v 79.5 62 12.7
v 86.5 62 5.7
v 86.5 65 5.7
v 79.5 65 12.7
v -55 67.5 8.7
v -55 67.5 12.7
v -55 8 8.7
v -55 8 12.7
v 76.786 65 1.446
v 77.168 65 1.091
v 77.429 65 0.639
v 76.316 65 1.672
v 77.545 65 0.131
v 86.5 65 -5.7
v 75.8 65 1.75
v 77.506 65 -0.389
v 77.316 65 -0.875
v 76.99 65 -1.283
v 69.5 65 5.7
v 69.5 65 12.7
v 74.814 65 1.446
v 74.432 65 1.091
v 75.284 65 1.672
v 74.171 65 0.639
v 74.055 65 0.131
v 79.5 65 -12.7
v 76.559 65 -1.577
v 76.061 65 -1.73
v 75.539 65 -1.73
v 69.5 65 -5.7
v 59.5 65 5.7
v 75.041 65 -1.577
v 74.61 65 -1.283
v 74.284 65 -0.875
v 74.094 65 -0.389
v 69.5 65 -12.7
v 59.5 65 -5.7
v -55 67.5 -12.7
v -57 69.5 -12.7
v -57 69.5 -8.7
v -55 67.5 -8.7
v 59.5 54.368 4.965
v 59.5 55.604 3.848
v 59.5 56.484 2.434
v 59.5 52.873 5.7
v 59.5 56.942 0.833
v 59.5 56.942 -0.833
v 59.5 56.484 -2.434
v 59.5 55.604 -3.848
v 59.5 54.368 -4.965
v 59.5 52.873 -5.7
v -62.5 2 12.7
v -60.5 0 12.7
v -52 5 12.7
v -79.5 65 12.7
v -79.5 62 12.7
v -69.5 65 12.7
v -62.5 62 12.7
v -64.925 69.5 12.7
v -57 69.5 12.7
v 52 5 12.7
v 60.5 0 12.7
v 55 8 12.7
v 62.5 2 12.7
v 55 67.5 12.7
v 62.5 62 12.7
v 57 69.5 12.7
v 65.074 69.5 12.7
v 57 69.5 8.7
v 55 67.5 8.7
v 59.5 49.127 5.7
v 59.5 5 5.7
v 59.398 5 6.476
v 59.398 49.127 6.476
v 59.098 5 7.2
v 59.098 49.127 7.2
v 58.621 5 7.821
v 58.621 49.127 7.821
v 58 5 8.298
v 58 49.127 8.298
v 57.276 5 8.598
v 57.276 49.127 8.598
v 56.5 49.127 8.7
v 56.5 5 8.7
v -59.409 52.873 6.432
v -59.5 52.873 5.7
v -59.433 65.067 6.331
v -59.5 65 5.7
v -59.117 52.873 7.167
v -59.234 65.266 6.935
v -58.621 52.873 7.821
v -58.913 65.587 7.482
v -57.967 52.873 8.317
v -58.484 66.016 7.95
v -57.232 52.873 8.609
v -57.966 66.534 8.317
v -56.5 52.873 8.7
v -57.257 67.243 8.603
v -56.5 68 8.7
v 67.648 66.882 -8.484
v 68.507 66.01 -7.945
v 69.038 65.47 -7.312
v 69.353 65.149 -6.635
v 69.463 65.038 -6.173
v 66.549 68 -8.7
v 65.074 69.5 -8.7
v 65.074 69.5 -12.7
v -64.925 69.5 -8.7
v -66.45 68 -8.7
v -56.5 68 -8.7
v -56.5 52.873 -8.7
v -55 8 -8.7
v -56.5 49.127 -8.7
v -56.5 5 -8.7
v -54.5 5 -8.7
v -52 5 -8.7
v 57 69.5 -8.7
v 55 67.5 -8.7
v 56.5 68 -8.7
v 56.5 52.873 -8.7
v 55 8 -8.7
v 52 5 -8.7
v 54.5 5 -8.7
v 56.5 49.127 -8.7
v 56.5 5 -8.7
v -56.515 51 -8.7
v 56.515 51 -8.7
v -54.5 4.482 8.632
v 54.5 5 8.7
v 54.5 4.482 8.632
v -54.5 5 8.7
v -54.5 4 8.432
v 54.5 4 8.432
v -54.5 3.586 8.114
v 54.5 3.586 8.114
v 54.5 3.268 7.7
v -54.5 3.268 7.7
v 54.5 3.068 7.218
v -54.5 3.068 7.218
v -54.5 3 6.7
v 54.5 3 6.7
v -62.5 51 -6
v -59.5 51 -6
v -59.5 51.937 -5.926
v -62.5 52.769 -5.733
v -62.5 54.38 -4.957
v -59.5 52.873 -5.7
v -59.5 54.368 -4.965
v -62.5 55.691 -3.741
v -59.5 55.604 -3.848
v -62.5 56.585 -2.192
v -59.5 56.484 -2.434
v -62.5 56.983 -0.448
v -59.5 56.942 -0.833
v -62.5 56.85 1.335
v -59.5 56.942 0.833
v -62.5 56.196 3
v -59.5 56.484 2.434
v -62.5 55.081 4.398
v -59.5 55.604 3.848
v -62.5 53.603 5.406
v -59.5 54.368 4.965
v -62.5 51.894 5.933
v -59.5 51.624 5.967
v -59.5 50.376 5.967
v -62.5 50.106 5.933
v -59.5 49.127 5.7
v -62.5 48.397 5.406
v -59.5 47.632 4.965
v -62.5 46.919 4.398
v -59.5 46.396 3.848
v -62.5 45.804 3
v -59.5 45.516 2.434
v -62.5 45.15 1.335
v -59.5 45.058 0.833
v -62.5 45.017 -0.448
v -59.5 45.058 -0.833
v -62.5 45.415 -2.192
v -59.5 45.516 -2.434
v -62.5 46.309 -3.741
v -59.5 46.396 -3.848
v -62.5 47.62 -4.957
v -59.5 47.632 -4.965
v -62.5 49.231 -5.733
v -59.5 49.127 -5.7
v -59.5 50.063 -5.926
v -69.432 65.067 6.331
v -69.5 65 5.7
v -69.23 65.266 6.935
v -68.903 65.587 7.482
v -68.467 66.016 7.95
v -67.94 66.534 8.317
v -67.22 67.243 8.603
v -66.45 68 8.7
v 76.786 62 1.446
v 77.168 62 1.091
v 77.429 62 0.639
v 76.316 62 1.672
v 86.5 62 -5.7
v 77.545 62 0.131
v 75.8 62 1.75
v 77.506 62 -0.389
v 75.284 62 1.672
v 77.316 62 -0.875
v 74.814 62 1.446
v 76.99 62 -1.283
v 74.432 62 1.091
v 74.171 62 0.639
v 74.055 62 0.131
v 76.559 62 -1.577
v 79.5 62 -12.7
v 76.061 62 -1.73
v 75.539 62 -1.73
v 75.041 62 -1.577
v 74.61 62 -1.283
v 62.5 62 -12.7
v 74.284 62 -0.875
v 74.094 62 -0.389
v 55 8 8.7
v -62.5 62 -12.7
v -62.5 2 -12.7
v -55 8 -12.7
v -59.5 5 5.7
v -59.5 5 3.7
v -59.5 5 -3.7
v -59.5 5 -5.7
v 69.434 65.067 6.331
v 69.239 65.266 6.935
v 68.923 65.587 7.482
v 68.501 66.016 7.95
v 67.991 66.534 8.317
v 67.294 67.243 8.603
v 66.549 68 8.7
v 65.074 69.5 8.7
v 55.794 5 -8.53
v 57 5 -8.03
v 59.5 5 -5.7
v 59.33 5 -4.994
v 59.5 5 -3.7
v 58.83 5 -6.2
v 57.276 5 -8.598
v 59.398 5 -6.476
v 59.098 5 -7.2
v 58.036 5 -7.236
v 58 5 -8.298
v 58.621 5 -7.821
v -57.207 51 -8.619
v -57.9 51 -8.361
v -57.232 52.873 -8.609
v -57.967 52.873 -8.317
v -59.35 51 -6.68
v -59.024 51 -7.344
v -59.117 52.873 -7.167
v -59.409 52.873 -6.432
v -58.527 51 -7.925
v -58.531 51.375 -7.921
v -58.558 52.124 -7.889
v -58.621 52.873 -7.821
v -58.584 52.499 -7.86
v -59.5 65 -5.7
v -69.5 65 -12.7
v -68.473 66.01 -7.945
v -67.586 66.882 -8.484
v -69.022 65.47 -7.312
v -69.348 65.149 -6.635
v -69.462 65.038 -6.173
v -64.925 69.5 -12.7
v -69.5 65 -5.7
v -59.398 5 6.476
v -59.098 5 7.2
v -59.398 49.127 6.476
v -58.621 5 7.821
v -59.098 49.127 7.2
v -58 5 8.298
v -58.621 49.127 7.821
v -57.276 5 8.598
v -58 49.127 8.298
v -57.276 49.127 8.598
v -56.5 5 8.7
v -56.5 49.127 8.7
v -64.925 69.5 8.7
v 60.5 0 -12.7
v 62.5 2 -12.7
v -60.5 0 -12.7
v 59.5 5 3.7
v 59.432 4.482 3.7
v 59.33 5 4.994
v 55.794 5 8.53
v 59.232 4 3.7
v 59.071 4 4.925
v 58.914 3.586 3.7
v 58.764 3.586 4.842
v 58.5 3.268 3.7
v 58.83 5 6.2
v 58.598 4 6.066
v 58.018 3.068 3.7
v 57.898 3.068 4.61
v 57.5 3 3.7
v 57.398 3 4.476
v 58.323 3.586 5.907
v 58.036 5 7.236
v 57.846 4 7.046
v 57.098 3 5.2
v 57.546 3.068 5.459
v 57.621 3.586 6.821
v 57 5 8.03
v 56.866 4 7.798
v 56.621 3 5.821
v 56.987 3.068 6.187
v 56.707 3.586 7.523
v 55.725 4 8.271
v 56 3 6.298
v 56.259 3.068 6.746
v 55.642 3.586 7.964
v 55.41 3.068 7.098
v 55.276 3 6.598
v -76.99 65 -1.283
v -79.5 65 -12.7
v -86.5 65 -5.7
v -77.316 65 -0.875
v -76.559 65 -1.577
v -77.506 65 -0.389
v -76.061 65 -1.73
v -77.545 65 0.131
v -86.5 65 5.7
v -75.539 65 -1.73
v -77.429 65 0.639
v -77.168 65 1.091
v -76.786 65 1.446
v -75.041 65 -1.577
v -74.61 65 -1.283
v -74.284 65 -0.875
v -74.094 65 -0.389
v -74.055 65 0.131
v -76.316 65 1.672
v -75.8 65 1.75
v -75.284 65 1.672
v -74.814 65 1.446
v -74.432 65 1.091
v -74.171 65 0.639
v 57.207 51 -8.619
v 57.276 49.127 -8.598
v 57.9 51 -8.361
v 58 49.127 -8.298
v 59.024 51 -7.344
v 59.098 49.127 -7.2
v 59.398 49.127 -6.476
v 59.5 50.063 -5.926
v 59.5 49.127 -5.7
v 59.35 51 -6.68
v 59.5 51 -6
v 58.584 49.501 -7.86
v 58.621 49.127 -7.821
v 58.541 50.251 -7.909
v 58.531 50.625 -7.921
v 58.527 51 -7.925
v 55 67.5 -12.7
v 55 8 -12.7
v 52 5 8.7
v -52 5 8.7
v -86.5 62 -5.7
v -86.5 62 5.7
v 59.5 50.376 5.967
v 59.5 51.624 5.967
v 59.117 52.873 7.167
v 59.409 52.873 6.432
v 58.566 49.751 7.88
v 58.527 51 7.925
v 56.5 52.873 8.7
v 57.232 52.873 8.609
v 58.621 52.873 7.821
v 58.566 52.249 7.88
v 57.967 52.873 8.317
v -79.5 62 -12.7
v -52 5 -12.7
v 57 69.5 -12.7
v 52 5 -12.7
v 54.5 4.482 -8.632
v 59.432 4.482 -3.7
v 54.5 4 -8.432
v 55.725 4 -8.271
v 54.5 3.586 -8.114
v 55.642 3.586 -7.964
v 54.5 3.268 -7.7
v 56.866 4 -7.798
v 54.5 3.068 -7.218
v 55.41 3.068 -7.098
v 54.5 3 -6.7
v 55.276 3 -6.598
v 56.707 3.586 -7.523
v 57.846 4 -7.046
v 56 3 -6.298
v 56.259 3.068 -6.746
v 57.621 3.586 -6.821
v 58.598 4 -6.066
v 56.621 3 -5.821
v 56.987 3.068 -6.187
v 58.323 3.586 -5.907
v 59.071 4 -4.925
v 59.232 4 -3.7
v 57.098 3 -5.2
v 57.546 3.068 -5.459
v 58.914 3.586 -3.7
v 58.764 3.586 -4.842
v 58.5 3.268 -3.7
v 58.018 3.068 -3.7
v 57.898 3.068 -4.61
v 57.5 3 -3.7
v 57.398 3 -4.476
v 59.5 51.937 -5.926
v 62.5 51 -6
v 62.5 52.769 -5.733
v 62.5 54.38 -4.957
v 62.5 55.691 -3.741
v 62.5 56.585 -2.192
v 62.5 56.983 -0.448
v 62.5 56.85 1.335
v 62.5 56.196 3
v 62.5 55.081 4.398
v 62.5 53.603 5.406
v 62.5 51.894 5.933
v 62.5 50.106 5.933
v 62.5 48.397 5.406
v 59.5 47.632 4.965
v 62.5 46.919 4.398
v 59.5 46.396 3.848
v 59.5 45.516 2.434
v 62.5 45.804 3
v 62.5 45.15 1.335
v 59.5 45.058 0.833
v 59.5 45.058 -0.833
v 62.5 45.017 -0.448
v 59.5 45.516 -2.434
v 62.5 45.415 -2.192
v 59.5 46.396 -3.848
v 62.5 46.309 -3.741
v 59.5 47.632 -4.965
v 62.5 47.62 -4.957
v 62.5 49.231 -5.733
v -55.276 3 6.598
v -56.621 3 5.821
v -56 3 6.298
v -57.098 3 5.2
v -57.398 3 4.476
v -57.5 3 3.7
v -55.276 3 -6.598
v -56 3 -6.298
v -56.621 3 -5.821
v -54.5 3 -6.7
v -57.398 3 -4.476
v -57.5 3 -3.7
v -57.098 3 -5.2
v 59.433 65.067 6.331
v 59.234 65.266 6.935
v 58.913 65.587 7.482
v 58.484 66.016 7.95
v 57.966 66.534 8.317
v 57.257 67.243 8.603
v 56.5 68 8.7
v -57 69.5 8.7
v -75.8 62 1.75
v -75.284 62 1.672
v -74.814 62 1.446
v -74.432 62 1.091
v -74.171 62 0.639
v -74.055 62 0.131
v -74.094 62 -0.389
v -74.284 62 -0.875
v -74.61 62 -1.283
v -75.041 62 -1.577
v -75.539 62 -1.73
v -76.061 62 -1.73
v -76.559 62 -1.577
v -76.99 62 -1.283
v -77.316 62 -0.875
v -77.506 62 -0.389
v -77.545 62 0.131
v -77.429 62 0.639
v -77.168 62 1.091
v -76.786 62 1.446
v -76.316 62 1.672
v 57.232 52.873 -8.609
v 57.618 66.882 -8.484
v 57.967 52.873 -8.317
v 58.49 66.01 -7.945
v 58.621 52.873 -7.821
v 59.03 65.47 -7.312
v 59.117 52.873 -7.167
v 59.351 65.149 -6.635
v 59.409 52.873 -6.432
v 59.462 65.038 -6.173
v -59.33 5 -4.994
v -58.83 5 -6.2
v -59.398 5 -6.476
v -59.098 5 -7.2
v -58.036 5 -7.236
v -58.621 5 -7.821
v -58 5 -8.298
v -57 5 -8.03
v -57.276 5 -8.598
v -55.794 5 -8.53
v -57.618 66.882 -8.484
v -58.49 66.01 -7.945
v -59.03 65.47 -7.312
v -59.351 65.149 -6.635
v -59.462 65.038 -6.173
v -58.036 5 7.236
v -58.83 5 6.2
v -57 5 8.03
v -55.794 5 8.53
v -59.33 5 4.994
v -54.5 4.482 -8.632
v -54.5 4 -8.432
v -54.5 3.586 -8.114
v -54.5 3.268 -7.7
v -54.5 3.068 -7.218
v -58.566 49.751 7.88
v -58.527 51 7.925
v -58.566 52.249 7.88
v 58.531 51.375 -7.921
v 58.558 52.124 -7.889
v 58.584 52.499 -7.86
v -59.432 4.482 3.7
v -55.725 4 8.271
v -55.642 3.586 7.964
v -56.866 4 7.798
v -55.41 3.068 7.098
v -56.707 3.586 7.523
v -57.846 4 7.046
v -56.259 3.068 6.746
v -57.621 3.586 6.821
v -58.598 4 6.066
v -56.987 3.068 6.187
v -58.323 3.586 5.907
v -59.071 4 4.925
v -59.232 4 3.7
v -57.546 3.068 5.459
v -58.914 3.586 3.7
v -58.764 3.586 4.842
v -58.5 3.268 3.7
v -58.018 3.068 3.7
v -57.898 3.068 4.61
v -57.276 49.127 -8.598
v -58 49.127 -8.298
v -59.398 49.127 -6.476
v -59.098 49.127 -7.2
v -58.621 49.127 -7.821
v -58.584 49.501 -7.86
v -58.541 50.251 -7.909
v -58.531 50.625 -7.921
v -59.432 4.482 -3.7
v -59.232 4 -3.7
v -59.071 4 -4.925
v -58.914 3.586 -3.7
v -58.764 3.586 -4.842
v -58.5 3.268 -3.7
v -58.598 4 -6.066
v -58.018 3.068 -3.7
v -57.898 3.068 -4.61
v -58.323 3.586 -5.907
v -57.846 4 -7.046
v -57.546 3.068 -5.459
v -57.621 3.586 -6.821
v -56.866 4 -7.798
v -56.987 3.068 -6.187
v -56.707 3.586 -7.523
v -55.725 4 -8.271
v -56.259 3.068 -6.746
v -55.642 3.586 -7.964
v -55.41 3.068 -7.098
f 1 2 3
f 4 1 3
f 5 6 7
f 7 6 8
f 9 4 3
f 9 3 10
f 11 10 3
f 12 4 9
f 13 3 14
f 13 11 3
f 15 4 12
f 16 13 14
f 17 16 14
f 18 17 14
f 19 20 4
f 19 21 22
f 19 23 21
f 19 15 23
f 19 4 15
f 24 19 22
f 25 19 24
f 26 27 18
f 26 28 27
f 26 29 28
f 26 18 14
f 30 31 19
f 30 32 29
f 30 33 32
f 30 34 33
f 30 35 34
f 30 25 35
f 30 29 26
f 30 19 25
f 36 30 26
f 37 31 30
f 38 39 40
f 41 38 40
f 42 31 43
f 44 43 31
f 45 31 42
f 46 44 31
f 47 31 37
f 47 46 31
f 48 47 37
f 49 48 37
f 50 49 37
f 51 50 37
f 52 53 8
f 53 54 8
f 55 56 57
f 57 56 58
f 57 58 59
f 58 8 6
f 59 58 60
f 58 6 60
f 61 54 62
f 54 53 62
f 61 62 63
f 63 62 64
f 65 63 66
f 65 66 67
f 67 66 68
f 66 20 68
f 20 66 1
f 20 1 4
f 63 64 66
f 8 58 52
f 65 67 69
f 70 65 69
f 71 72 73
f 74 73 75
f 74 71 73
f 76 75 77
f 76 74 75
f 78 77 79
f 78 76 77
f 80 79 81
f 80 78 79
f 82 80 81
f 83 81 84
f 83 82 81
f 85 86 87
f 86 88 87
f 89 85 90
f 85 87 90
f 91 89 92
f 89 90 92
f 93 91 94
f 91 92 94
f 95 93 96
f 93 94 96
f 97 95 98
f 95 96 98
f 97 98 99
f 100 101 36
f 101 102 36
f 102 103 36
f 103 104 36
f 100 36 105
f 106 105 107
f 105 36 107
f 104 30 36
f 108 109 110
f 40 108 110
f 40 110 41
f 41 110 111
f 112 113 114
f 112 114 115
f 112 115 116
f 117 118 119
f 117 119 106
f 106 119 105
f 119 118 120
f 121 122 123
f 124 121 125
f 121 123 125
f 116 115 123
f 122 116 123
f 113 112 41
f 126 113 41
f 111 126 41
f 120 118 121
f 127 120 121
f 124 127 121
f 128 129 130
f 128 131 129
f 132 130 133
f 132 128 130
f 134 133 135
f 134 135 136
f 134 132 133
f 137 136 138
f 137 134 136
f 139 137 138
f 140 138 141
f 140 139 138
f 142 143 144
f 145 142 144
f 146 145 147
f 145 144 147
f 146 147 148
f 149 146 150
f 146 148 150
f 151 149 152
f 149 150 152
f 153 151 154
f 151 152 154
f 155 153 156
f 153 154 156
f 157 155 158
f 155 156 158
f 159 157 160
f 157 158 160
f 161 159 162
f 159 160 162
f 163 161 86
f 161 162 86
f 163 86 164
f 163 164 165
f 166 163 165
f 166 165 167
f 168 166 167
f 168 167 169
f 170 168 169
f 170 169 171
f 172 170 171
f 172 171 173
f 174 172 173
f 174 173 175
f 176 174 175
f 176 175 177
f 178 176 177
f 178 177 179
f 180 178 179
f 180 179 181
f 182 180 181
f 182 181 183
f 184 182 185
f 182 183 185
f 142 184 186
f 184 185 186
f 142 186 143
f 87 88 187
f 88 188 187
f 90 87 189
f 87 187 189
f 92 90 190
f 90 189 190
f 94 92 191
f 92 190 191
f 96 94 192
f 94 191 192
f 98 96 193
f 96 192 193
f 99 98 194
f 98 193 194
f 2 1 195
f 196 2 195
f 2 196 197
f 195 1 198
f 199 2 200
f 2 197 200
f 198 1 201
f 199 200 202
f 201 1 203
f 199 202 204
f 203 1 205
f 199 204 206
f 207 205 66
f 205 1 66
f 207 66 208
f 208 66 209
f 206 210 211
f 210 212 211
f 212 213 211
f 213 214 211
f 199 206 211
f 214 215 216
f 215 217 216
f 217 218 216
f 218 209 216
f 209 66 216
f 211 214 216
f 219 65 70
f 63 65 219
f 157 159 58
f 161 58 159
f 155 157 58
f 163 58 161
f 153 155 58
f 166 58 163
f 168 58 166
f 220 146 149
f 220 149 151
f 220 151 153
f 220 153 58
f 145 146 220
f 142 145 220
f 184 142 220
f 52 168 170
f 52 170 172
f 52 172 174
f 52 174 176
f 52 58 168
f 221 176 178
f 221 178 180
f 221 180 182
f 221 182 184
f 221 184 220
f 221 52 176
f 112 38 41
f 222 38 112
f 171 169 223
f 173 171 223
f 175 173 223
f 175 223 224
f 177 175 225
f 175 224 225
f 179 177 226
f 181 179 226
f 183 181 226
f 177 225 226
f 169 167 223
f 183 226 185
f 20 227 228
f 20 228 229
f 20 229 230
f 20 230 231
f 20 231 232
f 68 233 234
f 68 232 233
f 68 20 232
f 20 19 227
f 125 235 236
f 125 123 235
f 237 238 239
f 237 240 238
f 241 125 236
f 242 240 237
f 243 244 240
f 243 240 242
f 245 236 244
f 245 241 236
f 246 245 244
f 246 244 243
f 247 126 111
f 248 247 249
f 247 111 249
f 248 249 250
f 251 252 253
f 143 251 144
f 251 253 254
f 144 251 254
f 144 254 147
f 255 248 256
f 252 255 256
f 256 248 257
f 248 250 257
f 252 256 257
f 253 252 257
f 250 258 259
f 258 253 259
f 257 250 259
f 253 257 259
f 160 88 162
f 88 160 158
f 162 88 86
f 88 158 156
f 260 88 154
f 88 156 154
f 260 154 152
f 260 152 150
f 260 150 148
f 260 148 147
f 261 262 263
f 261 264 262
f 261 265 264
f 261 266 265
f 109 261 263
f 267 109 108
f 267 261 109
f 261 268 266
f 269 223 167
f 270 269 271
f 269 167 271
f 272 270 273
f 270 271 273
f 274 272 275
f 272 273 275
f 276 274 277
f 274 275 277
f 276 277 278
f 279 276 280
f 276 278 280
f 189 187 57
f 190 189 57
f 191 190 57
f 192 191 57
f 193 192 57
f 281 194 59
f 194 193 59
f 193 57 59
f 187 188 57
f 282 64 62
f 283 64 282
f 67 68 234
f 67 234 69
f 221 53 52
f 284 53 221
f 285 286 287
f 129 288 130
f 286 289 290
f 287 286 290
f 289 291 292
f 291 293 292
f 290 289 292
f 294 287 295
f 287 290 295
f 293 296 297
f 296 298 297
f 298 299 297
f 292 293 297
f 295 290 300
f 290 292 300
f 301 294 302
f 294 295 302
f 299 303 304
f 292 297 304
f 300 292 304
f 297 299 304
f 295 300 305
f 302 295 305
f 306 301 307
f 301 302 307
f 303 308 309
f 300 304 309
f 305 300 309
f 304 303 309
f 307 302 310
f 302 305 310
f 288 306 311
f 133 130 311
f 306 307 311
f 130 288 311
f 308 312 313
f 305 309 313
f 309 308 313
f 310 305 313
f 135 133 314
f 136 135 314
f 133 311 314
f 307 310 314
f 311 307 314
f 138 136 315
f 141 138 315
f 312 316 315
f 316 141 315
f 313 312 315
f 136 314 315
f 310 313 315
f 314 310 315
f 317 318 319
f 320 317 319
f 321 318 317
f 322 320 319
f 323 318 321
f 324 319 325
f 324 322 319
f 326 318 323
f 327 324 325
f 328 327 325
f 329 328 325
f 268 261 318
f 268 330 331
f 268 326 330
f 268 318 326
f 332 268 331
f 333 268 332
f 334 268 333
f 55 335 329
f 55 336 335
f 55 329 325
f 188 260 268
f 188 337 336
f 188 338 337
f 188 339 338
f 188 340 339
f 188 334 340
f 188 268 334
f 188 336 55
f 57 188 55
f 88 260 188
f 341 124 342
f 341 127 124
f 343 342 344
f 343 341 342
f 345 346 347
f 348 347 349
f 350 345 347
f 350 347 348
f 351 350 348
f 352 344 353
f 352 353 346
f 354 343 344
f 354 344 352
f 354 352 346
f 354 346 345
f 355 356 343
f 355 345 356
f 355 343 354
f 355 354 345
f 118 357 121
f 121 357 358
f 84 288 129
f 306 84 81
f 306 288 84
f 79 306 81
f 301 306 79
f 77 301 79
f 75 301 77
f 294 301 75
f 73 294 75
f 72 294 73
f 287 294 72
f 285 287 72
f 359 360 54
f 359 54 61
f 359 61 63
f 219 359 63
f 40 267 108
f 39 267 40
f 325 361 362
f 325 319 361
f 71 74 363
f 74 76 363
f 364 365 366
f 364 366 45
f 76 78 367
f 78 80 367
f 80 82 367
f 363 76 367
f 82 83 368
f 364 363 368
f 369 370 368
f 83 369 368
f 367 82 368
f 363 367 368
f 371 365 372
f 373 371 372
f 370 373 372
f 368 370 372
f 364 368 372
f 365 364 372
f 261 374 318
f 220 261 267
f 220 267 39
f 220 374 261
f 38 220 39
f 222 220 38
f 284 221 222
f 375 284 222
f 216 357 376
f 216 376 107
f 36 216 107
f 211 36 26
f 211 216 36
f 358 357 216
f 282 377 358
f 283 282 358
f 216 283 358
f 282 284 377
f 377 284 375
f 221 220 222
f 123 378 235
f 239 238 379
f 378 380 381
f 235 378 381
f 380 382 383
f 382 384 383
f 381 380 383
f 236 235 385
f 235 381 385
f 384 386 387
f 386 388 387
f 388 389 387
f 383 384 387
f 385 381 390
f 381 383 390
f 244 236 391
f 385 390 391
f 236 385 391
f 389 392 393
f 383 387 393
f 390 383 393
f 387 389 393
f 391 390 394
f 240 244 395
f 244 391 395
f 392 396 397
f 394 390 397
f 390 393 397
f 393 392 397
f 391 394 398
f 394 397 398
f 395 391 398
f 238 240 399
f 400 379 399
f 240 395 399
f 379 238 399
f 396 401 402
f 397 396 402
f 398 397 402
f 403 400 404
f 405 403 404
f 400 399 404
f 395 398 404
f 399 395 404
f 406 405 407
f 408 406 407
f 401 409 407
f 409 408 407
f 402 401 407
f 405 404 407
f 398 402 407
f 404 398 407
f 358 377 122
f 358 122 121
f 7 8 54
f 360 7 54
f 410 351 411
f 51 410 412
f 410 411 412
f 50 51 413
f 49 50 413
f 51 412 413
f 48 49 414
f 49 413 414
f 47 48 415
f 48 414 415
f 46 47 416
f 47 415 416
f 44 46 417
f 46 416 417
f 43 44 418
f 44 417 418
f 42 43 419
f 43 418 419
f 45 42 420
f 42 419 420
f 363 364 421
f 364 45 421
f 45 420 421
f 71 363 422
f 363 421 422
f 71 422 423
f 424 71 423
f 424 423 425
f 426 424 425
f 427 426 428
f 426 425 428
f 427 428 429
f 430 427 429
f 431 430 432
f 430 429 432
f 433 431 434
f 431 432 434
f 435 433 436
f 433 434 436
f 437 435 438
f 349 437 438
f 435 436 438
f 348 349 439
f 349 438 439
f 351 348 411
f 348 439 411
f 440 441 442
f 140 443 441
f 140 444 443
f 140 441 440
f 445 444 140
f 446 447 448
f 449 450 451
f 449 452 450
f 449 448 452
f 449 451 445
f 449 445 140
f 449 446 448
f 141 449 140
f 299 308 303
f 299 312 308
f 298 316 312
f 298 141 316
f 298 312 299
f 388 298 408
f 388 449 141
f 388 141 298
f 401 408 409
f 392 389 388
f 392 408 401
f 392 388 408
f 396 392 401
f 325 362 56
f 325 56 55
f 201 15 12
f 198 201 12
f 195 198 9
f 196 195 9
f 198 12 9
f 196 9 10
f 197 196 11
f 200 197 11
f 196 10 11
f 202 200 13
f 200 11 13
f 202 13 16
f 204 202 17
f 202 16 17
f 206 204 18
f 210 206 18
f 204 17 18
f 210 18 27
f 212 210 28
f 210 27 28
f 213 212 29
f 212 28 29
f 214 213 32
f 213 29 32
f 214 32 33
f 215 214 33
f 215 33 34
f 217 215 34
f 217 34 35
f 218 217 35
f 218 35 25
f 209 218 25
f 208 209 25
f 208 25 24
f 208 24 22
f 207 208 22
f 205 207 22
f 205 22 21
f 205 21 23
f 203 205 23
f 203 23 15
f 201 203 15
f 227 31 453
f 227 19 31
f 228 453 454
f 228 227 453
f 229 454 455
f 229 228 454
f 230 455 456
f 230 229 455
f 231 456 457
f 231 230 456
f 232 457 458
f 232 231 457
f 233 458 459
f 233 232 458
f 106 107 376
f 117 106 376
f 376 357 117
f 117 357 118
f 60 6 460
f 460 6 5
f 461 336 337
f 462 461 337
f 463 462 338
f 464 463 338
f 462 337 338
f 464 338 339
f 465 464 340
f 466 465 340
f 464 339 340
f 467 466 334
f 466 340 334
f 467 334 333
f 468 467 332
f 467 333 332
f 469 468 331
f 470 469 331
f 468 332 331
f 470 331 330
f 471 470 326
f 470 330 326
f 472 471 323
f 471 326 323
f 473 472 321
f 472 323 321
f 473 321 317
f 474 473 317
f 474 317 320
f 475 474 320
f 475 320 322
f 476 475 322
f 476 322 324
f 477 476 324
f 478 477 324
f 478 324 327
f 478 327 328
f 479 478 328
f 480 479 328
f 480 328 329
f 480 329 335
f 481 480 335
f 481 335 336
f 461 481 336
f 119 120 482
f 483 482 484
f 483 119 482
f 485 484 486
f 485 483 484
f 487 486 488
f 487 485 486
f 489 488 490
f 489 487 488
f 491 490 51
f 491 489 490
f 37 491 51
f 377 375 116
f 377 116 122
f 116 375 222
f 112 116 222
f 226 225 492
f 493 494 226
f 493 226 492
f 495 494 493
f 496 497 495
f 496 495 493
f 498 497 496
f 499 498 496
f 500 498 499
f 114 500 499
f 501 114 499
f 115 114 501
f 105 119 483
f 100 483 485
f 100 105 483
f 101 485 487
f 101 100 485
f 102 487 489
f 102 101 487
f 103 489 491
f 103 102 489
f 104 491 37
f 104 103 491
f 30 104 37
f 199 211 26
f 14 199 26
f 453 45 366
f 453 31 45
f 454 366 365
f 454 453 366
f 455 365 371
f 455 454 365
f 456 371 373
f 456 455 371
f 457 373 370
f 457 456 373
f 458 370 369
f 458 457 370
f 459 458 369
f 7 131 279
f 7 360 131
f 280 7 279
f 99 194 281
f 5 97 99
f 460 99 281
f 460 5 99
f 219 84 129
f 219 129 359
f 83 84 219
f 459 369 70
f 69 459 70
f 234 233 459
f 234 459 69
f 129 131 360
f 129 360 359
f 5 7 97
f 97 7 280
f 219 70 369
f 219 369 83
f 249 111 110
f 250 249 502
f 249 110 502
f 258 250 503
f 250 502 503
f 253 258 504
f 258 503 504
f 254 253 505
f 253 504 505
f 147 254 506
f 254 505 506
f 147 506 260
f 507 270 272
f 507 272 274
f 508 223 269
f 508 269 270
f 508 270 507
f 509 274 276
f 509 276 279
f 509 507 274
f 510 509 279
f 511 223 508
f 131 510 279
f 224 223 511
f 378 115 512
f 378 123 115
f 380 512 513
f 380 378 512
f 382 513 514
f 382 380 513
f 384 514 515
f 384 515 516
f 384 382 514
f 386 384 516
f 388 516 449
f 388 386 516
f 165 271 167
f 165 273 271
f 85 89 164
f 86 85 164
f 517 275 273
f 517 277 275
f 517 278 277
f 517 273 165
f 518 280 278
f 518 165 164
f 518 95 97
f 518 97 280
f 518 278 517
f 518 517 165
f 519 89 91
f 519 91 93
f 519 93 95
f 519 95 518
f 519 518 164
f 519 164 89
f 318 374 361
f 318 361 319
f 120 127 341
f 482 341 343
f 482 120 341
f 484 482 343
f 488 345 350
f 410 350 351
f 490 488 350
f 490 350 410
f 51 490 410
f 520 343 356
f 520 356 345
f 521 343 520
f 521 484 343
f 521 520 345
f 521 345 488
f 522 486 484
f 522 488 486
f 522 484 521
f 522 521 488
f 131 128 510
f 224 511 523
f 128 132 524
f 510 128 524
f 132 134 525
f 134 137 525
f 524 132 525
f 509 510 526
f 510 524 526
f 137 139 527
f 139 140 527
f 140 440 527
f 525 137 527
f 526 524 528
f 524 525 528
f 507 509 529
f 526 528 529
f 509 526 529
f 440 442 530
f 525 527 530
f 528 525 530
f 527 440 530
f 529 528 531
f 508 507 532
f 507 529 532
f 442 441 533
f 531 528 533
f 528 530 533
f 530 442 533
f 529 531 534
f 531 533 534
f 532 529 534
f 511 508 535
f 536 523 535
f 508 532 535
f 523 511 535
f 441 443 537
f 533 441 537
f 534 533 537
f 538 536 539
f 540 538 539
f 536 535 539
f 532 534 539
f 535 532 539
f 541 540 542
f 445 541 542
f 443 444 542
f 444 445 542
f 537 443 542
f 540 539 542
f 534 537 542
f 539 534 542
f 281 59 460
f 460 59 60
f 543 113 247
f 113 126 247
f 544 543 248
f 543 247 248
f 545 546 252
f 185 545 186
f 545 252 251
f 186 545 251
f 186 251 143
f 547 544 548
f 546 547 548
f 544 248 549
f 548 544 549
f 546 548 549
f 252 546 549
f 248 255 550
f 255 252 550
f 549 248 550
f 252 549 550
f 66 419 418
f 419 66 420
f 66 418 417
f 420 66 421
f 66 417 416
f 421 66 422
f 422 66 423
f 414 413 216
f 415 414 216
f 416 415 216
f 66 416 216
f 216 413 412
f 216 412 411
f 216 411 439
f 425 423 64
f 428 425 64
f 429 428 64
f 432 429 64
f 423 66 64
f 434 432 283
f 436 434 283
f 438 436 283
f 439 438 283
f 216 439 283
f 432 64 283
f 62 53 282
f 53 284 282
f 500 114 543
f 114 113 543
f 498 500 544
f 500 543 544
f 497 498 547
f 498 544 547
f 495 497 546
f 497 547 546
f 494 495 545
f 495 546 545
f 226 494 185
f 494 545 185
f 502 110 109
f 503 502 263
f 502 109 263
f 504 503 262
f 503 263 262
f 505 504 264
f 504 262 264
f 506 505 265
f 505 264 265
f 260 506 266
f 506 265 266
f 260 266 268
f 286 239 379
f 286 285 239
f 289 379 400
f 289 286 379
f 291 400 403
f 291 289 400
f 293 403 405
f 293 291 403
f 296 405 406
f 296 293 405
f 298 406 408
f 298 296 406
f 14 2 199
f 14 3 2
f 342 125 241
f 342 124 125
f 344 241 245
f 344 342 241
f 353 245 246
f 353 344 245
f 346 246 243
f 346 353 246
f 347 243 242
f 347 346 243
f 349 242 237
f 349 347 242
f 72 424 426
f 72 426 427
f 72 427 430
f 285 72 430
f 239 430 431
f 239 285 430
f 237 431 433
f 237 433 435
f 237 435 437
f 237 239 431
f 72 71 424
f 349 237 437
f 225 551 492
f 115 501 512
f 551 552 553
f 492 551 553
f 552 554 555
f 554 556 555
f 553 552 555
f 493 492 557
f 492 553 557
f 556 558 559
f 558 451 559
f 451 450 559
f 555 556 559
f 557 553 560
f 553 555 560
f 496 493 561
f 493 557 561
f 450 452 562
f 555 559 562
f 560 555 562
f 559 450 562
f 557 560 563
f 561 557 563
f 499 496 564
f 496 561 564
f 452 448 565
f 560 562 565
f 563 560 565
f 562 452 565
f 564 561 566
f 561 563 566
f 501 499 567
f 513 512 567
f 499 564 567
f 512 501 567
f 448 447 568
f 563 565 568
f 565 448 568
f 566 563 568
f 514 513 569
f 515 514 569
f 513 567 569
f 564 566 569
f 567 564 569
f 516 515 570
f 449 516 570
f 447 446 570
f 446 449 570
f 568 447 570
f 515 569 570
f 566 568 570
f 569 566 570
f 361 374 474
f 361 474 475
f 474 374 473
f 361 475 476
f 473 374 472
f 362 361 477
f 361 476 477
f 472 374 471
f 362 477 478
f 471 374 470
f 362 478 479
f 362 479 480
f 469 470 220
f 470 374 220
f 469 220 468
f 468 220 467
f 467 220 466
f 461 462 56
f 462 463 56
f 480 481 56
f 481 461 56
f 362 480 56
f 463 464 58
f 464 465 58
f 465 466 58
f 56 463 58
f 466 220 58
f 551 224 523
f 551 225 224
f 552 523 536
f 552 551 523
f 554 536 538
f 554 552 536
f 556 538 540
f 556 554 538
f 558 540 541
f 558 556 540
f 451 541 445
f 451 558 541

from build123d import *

# Parameters (mm, degrees)
SKETCH1_W           = 125
SKETCH1_H           = 25.4
BOSS_EXTRUDE1_DEPTH = 5
SKETCH2_W           = 119
SKETCH2_H           = 17.4
CUT_EXTRUDE1_DEPTH  = 2
FILLET1_R           = 5
SKETCH3_W           = 3
SKETCH3_H           = 25.4
BOSS_EXTRUDE2_DEPTH = 60
CHAMFER1_SIZE       = 2
SKETCH4_R           = 6
CUT_EXTRUDE3_DEPTH  = 135.4
SKETCH5_W           = 25.4
SKETCH5_H           = 3
BOSS_EXTRUDE3_DEPTH = 24
SKETCH6_W           = 25.4
SKETCH6_H           = 3
BOSS_EXTRUDE4_DEPTH = 24
SKETCH9_R           = 1.75
CUT_EXTRUDE4_DEPTH  = 4
CHAMFER2_SIZE       = 7
BOSS_EXTRUDE5_DEPTH = 4
BOSS_EXTRUDE6_DEPTH = 4
CHAMFER3_SIZE       = 2
CHAMFER4_SIZE       = 3
FILLET5_R           = 2
FILLET6_R           = 3


# Some blends are built 0.0001 mm under size
with BuildPart() as part:
    # Sketch1 → Boss-Extrude1 (new body)
    with BuildSketch(Plane(origin=(0, 0, 0), x_dir=(1, 0, 0), z_dir=(0, 1, 0))):
        Rectangle(SKETCH1_W, SKETCH1_H)
    extrude(amount=BOSS_EXTRUDE1_DEPTH)

    # Sketch2 → Cut-Extrude1 (cut)
    with BuildSketch(Plane(origin=(0, 5, 0), x_dir=(1, 0, 0), z_dir=(0, 1, 0))):
        Rectangle(SKETCH2_W, SKETCH2_H)
    extrude(amount=-CUT_EXTRUDE1_DEPTH, mode=Mode.SUBTRACT)

    # Fillet1
    fillet1_edges = [part.edges().sort_by_distance(p)[0] for p in [
        (59.5, 4, -8.7),
        (59.5, 4, 8.7),
        (-59.5, 4, 8.7),
        (-59.5, 4, -8.7),
    ]]
    fillet(fillet1_edges, radius=FILLET1_R)

    # Sketch3 → Boss-Extrude2 (add)
    with BuildSketch(Plane(origin=(0, 5, 0), x_dir=(1, 0, 0), z_dir=(0, 1, 0))):
        with Locations((61, 0)):
            Rectangle(SKETCH3_W, SKETCH3_H)
        with Locations((-61, 0)):
            Rectangle(SKETCH3_W, SKETCH3_H)
    extrude(amount=BOSS_EXTRUDE2_DEPTH)

    # Chamfer1
    chamfer1_edges = [part.edges().sort_by_distance(p)[0] for p in [
        (-62.5, 0, 0),
        (62.5, 0, 0),
    ]]
    chamfer(chamfer1_edges, length=CHAMFER1_SIZE)

    # Sketch4 → Cut-Extrude3 (cut)
    with BuildSketch(Plane(origin=(62.5, 0, 0), x_dir=(0, 0, -1), z_dir=(1, 0, 0))):
        with Locations((0, 51)):
            Circle(SKETCH4_R)
    extrude(amount=-CUT_EXTRUDE3_DEPTH, mode=Mode.SUBTRACT)

    # Sketch5 → Boss-Extrude3 (add)
    with BuildSketch(Plane.ZY.offset(62.5)):
        with Locations((0, 63.5)):
            Rectangle(SKETCH5_W, SKETCH5_H)
    extrude(amount=BOSS_EXTRUDE3_DEPTH)

    # Sketch6 → Boss-Extrude4 (add)
    with BuildSketch(Plane(origin=(62.5, 0, 0), x_dir=(0, 0, -1), z_dir=(1, 0, 0))):
        with Locations((0, 63.5)):
            Rectangle(SKETCH6_W, SKETCH6_H)
    extrude(amount=BOSS_EXTRUDE4_DEPTH)

    # Sketch9 → Cut-Extrude4 (cut)
    with BuildSketch(Plane(origin=(0, 65, 0), x_dir=(1, 0, 0), z_dir=(0, 1, 0))):
        with Locations(Location((75.8, 0, 0), (0, 0, 270))):
            Circle(SKETCH9_R)
        with Locations(Location((-75.8, 0, 0), (0, 0, 270))):
            Circle(SKETCH9_R)
    extrude(amount=-CUT_EXTRUDE4_DEPTH, mode=Mode.SUBTRACT)

    # Chamfer2
    chamfer2_edges = [part.edges().sort_by_distance(p)[0] for p in [
        (-86.5, 63.5, -12.7),
        (-86.5, 63.5, 12.7),
        (86.5, 63.5, 12.7),
        (86.5, 63.5, -12.7),
    ]]
    chamfer(chamfer2_edges, length=CHAMFER2_SIZE)

    # Sketch10 → Boss-Extrude5 (add)
    with BuildSketch(Plane.XY.offset(12.7)):
        Polygon((-69.5, 65), (-64.924872653, 69.5), (-55, 69.5), (-55, 5), (-59.5, 5), (-59.5, 65), align=None)
        Polygon((69.5, 65), (65.073893694, 69.5), (55, 69.5), (55, 5), (59.5, 5), (59.5, 65), align=None)
    extrude(amount=-BOSS_EXTRUDE5_DEPTH)

    # Sketch11 → Boss-Extrude6 (add)
    with BuildSketch(Plane(origin=(0, 0, -12.7), x_dir=(-1, 0, 0), z_dir=(0, 0, -1))):
        Polygon((-69.5, 65), (-65.073893694, 69.5), (-55, 69.5), (-55, 5), (-59.5, 5), (-59.5, 65), align=None)
        Polygon((69.5, 65), (64.924872653, 69.5), (55, 69.5), (55, 5), (59.5, 5), (59.5, 65), align=None)
    extrude(amount=-BOSS_EXTRUDE6_DEPTH)

    # Chamfer3
    chamfer3_edges = [part.edges().sort_by_distance(p)[0] for p in [
        (-55, 69.5, 10.7),
        (55, 69.5, 10.7),
        (55, 69.5, -10.7),
        (-55, 69.5, -10.7),
    ]]
    chamfer(chamfer3_edges, length=CHAMFER3_SIZE)

    # Chamfer4
    # the kernel refuses this chamfer: 3 mm, written as the material it adds along each edge
    with BuildSketch(Plane(origin=(-55, 5, 12.7), x_dir=(-0.02749587661058672, 0.9996219169112968, 0), z_dir=(0, 0, -1)), Plane(origin=(55, 5, 12.7), x_dir=(-0.9996219169112968, -0.02749587661058648, 0), z_dir=(0, 0, -1)), Plane(origin=(-55, 5, -12.7), x_dir=(0.9996219169112968, -0.02749587661058648, 0), z_dir=(0, 0, 1))) as chamfer4_piece_1:
        Polygon((CHAMFER4_SIZE * 0.999621916911, CHAMFER4_SIZE * 0.0274958766106), (-CHAMFER4_SIZE * 0.0274958766106, CHAMFER4_SIZE * 0.999621916911), (0, 0), align=None)
    extrude(amount=4)
    with BuildSketch(Plane(origin=(55, 5, -12.7), x_dir=(-0.9996219169112968, -0.02749587661058648, 0), z_dir=(0, 0, 1))) as chamfer4_piece_2:
        Polygon((CHAMFER4_SIZE * 0.999621916911, -CHAMFER4_SIZE * 0.0274958766106), (-CHAMFER4_SIZE * 0.0274958766106, -CHAMFER4_SIZE * 0.999621916911), (0, 0), align=None)
    extrude(amount=4)

    # Fillet5
    fillet5_edges = [part.edges().sort_by_distance(p)[0] for p in [
        (-58.035533906, 3, 7.235533906),
        (-59.5, 3, 0),
        (-58.035533906, 3, -7.235533906),
        (0, 3, -8.7),
        (58.035533906, 3, -7.235533906),
        (59.5, 3, 0),
        (58.035533906, 3, 7.235533906),
        (0, 3, 8.7),
    ]]
    fillet(fillet5_edges, radius=FILLET5_R - 0.0001)  # a hair under: the kernel refuses the full size

    # Fillet6
    fillet6_edges = [part.edges().sort_by_distance(p)[0] for p in [
        (-64.5, 65, 8.7),
        (-59.5, 35, 8.7),
        (64.5, 65, 8.7),
        (59.5, 35, 8.7),
        (64.5, 65, -8.7),
        (59.5, 35, -8.7),
        (-64.5, 65, -8.7),
        (-59.5, 35, -8.7),
    ]]
    fillet(fillet6_edges, radius=FILLET6_R)


solid = part.part
